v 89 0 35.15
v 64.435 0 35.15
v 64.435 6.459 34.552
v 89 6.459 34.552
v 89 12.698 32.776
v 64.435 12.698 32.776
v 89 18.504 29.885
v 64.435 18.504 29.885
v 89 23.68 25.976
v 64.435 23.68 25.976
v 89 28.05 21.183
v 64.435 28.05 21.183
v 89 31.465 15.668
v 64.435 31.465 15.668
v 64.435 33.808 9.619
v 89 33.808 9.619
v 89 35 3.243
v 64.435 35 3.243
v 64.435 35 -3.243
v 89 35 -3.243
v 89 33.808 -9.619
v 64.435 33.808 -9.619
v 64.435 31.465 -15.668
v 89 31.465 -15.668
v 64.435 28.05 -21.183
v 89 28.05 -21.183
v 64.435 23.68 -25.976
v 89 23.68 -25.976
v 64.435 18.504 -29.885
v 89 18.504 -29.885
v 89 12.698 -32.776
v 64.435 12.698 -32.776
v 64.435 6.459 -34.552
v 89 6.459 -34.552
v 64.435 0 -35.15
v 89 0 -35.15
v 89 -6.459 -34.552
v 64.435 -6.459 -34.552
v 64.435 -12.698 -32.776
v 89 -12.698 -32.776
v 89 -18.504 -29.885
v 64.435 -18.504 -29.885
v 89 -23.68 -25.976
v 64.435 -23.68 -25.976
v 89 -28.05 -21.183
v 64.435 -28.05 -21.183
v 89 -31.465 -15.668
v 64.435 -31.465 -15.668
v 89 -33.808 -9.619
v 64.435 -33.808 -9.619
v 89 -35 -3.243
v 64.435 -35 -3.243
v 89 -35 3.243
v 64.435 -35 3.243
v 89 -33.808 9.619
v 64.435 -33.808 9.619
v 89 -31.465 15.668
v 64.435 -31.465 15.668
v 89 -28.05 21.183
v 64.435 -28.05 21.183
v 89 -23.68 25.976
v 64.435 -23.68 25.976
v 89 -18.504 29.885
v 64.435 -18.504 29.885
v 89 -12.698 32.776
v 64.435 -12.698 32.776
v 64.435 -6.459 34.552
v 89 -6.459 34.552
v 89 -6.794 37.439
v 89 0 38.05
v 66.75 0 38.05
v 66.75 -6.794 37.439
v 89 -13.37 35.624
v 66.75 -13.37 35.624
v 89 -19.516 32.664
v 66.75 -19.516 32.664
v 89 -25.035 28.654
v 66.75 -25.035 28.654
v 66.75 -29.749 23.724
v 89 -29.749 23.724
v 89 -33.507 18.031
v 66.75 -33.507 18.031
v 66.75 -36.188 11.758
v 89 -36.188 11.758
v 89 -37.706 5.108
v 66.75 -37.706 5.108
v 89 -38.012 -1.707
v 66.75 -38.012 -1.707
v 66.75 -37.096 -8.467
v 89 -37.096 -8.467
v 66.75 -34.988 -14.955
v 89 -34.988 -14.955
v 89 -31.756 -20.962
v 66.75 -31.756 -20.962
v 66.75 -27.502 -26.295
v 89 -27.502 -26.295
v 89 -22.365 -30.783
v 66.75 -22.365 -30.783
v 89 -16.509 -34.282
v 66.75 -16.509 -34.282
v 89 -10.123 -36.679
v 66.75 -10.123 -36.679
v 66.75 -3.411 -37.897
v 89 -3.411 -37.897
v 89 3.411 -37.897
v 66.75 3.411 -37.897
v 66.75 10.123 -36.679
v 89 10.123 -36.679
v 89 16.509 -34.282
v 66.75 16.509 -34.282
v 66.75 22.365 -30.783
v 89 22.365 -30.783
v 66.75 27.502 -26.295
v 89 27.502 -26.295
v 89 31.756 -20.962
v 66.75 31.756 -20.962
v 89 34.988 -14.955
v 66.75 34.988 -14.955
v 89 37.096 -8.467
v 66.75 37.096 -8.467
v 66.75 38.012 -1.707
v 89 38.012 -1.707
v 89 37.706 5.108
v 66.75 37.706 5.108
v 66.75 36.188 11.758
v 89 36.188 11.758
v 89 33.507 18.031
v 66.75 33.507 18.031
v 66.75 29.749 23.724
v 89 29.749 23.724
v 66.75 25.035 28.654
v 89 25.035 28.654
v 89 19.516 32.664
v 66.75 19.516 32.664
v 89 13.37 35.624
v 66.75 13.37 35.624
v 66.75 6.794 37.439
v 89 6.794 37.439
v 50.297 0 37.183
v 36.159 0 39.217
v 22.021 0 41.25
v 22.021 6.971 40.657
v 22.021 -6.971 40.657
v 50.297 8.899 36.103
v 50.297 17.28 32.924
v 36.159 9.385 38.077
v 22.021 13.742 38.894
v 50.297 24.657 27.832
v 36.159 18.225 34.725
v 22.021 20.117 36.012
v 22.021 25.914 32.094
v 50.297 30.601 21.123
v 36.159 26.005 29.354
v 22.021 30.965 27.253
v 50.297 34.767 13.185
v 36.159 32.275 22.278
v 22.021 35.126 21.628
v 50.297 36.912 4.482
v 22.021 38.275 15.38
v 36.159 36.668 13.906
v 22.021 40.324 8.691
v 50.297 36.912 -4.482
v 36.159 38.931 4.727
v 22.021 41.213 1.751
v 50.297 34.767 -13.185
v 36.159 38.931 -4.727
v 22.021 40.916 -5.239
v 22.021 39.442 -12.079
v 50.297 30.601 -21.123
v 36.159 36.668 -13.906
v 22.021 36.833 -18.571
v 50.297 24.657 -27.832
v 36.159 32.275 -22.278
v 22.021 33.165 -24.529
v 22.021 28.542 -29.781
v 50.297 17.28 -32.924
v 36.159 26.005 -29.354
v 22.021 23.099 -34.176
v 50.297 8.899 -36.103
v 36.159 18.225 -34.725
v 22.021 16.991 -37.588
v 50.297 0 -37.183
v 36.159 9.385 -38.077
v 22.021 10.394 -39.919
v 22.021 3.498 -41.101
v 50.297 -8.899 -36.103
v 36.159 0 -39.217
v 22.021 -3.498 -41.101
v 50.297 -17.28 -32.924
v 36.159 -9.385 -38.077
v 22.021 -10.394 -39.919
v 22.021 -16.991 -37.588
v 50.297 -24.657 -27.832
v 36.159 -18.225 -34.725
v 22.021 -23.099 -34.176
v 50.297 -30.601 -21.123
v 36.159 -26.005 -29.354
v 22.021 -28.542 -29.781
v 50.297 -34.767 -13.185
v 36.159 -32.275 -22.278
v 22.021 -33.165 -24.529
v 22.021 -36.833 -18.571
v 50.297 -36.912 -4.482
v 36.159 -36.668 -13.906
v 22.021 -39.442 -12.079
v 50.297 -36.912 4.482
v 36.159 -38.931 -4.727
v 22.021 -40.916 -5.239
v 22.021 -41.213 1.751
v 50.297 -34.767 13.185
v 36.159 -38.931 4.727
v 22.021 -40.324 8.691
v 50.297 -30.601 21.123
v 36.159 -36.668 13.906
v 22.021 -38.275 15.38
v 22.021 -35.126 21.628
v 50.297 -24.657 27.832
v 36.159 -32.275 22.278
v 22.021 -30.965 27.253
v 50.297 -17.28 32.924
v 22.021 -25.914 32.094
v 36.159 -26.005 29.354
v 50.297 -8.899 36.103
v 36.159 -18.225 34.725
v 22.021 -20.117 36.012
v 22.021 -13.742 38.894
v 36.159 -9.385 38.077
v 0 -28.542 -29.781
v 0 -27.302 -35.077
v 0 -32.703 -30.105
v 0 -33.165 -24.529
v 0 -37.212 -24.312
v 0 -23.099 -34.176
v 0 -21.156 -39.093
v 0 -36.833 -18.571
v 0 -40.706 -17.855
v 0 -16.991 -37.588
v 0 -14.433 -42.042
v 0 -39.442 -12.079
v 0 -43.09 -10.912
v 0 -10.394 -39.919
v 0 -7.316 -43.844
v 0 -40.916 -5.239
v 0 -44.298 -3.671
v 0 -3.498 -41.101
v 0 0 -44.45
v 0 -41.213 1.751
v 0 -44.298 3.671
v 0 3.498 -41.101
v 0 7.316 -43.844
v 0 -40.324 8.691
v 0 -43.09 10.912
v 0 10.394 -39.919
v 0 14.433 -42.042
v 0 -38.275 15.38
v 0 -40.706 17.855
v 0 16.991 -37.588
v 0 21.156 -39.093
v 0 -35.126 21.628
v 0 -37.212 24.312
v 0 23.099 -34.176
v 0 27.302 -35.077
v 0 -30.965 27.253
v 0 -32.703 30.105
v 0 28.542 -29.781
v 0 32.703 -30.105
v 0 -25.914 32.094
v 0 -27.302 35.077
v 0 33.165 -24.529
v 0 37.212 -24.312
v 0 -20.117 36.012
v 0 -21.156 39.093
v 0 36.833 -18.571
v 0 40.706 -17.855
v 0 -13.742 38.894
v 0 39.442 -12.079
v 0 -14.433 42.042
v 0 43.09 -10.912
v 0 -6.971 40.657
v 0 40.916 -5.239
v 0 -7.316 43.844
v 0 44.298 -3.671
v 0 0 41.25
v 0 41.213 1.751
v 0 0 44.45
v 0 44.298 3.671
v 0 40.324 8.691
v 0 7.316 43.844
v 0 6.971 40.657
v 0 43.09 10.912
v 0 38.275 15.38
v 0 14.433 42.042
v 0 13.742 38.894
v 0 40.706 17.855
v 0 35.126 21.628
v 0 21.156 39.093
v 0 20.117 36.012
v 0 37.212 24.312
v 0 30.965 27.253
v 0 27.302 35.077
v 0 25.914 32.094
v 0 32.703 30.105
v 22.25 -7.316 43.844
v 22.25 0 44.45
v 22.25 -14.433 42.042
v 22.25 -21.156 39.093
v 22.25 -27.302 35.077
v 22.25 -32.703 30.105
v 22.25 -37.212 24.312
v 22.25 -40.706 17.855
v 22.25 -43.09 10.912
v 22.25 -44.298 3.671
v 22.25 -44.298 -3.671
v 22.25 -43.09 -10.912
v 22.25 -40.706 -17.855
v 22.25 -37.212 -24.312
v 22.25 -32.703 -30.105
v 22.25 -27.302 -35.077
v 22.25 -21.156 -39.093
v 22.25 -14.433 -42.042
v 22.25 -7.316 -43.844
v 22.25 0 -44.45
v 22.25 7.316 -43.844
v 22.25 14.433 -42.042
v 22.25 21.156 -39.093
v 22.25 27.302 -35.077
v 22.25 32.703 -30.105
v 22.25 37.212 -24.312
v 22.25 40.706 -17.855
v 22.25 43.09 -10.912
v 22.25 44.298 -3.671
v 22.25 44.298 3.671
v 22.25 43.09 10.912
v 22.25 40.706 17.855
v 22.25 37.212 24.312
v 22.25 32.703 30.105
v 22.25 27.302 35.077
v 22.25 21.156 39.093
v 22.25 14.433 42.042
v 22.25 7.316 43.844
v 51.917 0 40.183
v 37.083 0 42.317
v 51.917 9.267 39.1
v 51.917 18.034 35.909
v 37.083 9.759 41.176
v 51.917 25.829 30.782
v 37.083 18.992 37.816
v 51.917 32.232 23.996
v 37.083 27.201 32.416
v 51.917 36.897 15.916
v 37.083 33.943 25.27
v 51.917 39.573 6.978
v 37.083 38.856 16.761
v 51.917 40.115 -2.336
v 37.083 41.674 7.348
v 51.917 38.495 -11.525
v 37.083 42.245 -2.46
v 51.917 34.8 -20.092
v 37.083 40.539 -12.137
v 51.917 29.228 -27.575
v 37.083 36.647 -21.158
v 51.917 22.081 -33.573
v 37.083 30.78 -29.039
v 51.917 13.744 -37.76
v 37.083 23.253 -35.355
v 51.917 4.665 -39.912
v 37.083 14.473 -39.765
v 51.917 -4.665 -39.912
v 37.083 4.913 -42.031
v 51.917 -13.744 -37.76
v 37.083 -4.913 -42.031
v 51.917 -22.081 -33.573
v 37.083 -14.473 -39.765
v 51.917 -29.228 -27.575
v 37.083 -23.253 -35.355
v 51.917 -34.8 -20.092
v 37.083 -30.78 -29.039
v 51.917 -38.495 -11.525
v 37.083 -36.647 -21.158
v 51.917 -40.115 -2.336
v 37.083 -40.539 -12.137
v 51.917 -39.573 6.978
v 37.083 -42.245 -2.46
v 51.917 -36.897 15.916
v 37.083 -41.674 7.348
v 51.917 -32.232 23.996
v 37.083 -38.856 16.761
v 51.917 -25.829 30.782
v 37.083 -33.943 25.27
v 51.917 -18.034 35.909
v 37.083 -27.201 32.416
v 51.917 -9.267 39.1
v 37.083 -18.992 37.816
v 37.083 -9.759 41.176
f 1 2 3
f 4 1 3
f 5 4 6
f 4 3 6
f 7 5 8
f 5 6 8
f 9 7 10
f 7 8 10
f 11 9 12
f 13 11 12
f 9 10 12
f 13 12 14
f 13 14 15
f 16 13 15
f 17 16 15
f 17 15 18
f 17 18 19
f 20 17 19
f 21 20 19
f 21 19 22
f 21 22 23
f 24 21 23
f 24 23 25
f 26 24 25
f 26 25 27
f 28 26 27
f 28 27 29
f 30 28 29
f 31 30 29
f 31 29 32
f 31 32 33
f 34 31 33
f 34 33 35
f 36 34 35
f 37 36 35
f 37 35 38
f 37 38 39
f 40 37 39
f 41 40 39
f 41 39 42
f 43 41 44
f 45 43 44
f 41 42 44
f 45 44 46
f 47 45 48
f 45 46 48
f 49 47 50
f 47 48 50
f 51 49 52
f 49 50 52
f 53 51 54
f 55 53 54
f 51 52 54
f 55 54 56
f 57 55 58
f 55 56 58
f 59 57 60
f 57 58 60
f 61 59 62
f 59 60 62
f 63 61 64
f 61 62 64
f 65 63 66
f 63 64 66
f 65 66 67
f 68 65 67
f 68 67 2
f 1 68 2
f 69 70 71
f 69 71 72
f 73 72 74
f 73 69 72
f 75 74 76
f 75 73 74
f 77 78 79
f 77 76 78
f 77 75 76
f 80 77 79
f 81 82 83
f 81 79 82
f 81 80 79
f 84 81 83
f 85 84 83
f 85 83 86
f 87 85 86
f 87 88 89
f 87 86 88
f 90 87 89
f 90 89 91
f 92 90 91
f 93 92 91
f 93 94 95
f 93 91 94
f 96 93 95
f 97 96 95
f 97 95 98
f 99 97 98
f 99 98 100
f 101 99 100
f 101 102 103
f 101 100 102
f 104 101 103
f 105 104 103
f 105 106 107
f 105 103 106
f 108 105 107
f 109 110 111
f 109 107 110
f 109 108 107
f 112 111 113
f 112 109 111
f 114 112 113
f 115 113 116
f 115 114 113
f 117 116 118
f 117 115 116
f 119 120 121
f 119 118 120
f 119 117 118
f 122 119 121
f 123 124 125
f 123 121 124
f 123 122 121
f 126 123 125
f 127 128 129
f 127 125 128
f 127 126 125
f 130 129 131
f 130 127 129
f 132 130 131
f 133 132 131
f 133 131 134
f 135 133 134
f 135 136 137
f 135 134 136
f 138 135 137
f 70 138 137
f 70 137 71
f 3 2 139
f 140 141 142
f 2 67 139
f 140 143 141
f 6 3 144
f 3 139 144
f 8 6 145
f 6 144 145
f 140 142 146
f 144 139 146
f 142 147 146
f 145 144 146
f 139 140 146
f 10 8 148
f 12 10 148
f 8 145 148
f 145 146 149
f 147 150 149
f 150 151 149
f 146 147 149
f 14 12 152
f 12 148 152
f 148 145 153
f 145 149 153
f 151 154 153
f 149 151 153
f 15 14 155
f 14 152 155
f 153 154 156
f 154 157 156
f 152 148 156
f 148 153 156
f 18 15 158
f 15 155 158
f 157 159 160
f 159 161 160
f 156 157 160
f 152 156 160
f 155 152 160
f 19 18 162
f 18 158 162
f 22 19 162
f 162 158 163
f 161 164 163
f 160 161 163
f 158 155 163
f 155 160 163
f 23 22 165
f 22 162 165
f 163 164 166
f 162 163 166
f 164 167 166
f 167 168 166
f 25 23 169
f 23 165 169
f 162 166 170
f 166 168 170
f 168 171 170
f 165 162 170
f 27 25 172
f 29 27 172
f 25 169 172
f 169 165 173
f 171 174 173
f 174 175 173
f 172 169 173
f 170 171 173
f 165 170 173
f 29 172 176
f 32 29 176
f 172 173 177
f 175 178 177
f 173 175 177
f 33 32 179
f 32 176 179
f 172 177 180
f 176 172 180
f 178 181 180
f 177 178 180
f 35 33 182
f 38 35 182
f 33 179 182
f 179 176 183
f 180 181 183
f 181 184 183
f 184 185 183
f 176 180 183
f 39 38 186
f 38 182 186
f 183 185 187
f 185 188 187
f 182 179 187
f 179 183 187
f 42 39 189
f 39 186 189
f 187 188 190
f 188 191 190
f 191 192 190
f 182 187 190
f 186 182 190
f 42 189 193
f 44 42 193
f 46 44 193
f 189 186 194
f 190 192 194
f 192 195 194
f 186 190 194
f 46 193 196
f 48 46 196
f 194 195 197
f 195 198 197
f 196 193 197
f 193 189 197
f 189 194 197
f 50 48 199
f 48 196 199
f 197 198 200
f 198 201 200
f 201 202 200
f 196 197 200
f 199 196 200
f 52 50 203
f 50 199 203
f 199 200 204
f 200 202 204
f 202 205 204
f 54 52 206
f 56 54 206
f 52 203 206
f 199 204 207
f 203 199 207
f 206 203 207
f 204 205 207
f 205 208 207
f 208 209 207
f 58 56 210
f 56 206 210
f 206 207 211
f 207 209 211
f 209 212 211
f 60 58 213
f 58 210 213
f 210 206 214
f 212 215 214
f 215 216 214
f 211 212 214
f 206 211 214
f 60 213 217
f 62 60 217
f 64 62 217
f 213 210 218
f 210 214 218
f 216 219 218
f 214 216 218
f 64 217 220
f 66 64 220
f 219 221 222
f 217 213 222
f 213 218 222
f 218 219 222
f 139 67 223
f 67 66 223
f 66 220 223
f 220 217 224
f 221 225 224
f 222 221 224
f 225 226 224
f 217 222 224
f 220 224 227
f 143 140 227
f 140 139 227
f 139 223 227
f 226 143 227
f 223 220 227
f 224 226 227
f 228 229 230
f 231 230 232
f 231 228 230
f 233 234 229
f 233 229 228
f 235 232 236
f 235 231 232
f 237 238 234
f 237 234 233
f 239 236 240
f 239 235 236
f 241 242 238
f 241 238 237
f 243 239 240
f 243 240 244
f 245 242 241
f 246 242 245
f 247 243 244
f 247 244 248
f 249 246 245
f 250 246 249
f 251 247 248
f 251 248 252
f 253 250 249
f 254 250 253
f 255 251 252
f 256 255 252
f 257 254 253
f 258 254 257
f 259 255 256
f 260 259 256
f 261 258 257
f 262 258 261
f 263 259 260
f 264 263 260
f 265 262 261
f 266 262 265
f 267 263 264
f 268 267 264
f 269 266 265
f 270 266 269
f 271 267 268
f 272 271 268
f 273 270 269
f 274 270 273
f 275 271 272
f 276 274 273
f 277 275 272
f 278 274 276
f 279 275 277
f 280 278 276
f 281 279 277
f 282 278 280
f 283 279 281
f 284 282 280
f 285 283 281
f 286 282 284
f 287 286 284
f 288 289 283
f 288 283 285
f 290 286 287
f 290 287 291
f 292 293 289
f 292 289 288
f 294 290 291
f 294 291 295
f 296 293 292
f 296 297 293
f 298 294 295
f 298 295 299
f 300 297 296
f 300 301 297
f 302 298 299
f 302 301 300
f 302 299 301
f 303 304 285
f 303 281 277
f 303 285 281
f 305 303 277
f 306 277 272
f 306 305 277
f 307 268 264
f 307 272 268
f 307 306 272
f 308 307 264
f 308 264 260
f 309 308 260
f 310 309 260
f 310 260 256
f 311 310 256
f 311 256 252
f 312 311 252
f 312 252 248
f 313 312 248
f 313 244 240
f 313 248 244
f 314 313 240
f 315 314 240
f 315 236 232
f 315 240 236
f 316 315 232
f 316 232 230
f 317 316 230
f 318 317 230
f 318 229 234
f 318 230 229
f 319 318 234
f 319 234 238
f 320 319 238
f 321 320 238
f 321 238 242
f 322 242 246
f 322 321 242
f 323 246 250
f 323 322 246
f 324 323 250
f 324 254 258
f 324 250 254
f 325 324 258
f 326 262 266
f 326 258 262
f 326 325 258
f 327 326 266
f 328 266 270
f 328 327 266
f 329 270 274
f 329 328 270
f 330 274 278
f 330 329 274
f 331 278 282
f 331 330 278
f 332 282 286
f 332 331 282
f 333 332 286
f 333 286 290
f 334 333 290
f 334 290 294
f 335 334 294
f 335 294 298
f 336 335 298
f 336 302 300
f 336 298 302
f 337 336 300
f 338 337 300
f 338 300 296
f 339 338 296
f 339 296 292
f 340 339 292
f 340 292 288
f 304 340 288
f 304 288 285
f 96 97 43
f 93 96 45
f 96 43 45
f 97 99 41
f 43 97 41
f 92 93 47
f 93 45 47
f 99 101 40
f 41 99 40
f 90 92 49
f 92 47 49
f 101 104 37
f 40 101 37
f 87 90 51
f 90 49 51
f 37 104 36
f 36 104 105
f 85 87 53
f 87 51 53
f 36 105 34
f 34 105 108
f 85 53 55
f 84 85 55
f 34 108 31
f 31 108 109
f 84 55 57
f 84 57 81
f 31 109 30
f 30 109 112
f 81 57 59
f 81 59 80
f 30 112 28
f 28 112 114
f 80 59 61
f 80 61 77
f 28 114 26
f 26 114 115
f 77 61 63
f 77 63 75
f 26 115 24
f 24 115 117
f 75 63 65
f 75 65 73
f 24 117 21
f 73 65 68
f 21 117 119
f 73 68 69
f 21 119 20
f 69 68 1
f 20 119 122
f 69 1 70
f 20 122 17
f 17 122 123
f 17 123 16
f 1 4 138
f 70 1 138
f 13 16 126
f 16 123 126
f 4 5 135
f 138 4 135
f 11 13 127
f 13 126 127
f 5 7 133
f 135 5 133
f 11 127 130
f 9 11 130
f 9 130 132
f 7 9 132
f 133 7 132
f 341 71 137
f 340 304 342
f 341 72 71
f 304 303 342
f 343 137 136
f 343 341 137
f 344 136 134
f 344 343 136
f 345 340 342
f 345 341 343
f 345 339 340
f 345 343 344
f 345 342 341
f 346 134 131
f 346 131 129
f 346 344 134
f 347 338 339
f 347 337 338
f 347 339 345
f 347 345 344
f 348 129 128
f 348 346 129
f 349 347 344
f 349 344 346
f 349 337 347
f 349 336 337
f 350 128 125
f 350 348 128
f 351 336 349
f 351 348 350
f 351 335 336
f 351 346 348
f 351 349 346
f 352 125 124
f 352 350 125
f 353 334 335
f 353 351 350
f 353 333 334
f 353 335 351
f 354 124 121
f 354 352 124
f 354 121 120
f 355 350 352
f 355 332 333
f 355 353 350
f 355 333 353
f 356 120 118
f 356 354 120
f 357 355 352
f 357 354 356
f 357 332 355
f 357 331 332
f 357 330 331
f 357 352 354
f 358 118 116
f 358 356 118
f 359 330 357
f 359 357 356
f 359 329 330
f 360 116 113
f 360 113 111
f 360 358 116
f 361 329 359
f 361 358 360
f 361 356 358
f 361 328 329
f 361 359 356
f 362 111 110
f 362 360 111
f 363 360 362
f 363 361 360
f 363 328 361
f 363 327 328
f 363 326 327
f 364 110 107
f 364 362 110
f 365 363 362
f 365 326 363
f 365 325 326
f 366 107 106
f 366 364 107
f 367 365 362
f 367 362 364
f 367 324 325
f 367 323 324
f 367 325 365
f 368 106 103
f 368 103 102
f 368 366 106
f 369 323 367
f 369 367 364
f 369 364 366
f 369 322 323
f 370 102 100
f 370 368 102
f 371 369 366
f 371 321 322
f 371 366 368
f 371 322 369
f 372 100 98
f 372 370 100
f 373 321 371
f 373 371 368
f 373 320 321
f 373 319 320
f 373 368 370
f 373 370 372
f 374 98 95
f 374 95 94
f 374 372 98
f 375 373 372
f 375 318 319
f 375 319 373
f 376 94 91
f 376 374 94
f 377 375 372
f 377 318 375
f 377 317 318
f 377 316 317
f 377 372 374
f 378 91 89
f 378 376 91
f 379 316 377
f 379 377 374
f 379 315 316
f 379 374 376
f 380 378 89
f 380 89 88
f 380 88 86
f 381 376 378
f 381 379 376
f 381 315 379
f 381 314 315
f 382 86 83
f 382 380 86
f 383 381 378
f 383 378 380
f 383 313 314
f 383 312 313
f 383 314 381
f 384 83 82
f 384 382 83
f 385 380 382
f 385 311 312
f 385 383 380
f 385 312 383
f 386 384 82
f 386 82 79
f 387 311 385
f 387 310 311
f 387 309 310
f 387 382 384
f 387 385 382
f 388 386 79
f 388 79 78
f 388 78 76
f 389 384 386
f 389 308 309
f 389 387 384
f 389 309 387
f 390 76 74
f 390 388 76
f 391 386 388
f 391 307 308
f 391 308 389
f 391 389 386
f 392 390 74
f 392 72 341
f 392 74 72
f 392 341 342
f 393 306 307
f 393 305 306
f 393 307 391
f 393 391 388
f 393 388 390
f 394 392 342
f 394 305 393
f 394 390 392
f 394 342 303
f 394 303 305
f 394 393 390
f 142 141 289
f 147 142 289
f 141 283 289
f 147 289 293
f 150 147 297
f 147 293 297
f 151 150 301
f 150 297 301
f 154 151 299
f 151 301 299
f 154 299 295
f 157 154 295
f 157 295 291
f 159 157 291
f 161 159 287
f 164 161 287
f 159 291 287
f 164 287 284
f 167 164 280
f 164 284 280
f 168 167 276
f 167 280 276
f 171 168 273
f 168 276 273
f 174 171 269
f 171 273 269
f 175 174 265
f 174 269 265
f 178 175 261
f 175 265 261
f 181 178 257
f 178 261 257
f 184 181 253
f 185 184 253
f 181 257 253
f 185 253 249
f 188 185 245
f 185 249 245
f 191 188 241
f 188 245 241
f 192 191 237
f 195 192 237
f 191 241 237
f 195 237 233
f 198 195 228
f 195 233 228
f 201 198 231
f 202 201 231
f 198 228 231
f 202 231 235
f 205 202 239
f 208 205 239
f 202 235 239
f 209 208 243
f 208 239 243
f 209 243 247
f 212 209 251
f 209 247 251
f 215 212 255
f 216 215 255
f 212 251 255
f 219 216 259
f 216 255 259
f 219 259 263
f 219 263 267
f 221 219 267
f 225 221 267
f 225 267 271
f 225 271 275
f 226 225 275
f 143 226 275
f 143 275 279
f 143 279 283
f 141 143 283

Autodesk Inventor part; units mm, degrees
ref_plane "YZ Plane" through (0, 0, 0) normal (1, 0, 0) x (0, 1, 0)
ref_plane "XZ Plane" through (0, 0, 0) normal (0, 1, 0) x (-1, 0, 0)
ref_plane "XY Plane" through (0, 0, 0) normal (0, 0, 1) x (1, 0, 0)
sketch "Sketch1" plane through (0, 0, 0) normal (0, 1, 0) x (-1, 0, 0)
  line L0 (0, 44.45) -> (-22.25, 44.45)
  line L1 (-22.25, 44.45) -> (-66.75, 38.05)
  line L2 (-66.75, 38.05) -> (-89, 38.05)
  line L3 (-89, 0) -> (0, 0)
  line L4 (-89, 35.15) -> (-64.4351, 35.15)
  line L5 (-64.4351, 35.15) -> (-22.0211, 41.25)
  line L6 (-22.0211, 41.25) -> (0, 41.25)
  line L7 (-89, 0) -> (-89, 35.15) construction
  line L8 (-89, 38.05) -> (-89, 35.15)
  line L9 (0, 44.45) -> (0, 41.25)
  line L10 (0, 0) -> (0, 41.25) construction
  dimension "d0" = 88.9
  dimension "d1" = 76.1
  dimension "d2" = 3.2
  dimension "d3" = 2.9
  dimension "d4" = 89
  dimension "d5" = 22.25
  dimension "d6" = 22.25
  dimension "d7" = 3.2
revolve "Revolution1" add sketch "Sketch1" angle 360 about axis through (89, 0, 0) along (-1, 0, 0)
equation "\"d0\" = D"
equation "\"d1\" = D1"
equation "\"d2\" = T"
equation "\"d3\" = T1"
equation "\"d4\" = L"
equation "\"d5\" = 0.25 * L"
equation "\"d6\" = 0.25 * L"
equation "\"d7\" = T"
equation "\"T\" = 3.2"
equation "\"D\" = 88.9"
equation "\"D1\" = 76.1"
equation "\"L\" = 89"
equation "\"T1\" = 2.9"
equation "\"Size_Designation\" = 1.2345"
properties part number "ISO 5251 Concentric reducers DN80 x DN65 3,2" material "Stainless Steel"
